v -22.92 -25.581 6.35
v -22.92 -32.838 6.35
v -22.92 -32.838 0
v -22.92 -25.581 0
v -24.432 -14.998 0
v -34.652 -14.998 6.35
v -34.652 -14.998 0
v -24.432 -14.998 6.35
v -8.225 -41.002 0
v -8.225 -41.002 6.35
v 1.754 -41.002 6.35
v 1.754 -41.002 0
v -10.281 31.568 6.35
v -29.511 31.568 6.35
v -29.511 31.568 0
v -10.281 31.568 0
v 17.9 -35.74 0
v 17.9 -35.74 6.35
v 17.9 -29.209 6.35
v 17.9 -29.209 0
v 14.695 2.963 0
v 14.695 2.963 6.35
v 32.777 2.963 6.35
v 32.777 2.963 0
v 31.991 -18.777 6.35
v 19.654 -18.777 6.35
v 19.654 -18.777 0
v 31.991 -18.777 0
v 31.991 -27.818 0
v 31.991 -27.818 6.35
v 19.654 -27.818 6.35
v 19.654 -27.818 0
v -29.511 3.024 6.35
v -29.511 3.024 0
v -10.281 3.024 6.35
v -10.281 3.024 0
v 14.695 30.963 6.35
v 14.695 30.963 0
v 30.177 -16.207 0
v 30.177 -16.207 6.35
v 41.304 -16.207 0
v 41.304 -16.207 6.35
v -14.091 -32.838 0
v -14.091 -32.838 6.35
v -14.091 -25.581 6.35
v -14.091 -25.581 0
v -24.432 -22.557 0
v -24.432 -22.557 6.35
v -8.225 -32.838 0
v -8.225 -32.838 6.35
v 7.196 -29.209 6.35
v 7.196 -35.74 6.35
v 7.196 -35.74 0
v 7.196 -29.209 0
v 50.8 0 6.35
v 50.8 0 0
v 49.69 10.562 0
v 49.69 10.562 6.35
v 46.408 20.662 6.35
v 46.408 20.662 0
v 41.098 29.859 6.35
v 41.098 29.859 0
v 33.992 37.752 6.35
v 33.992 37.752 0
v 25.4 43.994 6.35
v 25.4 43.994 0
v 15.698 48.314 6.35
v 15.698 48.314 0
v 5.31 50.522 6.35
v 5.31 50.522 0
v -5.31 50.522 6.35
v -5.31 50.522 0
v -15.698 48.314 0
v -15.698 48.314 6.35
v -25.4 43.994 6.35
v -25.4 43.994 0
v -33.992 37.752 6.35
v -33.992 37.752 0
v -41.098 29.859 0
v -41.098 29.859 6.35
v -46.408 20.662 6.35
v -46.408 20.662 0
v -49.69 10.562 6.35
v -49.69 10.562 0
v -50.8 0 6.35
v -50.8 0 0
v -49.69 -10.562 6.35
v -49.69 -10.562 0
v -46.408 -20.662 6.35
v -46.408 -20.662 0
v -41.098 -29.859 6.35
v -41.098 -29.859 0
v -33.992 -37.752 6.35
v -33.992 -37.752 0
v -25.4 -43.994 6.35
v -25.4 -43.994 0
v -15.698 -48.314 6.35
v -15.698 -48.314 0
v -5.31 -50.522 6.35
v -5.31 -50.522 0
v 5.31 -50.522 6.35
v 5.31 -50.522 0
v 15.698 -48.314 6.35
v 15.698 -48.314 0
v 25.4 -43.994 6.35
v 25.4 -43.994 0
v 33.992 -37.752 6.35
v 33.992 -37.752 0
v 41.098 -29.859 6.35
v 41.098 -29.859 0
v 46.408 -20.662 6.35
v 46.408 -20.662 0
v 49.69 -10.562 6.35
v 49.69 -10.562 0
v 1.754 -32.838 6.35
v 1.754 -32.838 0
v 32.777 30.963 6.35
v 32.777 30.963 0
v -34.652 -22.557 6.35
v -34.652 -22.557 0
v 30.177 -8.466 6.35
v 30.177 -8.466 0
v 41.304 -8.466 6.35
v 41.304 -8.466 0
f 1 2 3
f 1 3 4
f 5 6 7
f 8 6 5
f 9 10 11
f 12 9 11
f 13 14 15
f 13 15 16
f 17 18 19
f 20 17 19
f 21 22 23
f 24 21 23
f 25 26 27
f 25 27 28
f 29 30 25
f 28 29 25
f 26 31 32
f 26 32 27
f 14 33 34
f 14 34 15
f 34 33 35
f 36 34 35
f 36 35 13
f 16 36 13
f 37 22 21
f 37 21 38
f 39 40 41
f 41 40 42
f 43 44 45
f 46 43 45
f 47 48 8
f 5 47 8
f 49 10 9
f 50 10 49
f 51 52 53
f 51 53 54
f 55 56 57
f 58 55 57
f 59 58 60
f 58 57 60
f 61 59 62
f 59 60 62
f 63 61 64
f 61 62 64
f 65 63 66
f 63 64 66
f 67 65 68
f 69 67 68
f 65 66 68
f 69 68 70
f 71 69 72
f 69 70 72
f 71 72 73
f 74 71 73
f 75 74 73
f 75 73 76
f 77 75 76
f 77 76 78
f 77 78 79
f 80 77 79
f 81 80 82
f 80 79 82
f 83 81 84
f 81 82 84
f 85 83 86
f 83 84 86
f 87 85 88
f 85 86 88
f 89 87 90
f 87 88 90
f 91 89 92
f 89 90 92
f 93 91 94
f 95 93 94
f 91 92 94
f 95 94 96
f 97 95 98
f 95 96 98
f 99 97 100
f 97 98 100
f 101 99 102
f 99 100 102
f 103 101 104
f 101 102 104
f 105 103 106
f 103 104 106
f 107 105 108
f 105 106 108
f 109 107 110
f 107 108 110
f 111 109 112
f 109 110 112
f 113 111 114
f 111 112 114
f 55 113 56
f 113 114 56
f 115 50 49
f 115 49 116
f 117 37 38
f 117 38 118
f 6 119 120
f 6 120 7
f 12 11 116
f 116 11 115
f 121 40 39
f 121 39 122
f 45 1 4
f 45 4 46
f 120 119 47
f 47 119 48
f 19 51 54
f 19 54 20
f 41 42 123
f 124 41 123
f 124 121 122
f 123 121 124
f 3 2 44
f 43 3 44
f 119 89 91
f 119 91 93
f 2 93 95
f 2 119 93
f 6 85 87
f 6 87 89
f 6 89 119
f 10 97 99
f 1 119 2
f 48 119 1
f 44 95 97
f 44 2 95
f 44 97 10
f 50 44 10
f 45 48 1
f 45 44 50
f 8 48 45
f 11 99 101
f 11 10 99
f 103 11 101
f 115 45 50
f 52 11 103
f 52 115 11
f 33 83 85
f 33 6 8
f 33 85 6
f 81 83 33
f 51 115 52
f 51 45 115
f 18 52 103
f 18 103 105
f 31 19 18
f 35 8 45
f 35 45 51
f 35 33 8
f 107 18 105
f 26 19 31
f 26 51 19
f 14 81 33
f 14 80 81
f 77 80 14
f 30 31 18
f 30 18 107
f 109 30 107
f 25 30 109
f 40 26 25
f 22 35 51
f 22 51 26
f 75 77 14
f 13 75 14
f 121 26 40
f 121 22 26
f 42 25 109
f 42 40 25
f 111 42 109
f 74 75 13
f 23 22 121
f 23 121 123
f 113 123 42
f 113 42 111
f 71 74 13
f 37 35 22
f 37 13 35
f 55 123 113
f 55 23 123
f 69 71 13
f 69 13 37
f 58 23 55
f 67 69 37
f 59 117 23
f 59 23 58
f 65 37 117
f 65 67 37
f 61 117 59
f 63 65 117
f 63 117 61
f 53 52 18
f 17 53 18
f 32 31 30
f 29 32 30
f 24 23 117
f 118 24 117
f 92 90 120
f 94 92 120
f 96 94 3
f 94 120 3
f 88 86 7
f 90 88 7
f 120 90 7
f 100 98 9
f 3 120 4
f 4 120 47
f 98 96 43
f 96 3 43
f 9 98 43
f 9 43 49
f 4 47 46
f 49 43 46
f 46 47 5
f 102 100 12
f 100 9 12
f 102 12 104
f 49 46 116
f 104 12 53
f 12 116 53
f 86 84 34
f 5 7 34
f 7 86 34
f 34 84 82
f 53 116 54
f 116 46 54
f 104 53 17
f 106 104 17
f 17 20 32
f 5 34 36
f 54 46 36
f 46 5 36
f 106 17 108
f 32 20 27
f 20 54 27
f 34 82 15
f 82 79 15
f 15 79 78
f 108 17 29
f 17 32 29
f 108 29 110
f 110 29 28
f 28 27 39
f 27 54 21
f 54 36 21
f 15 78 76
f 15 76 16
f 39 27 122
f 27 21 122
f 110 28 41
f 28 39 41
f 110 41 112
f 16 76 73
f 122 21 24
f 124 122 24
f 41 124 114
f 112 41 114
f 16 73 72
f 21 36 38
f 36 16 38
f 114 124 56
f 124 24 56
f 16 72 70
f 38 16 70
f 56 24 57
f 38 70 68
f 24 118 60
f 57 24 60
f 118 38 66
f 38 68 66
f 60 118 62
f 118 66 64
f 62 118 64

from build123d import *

# Parameters (mm, degrees)
SKETCH1_R           = 50.8
BOSS_EXTRUDE1_DEPTH = 6.35
SKETCH2_W           = 19.230854478
SKETCH2_H           = 28.543909792
SKETCH2_W_2         = 18.081841161
SKETCH2_H_2         = 27.999640326
SKETCH2_W_3         = 10.22017109
SKETCH2_H_3         = 7.559298144
SKETCH2_W_4         = 8.829260232
SKETCH2_H_4         = 7.256926218
SKETCH2_W_5         = 9.97827355
SKETCH2_H_5         = 8.164041996
SKETCH2_W_6         = 10.703966172
SKETCH2_H_6         = 6.531233596
SKETCH2_W_7         = 12.336774571
SKETCH2_H_7         = 9.04092058
SKETCH2_W_8         = 11.127286868
SKETCH2_H_8         = 7.7407213
CUT_EXTRUDE1_DEPTH  = 73.122135992


with BuildPart() as part:
    # Sketch1 → Boss-Extrude1 (new body)
    with BuildSketch(Plane.XY):
        Circle(SKETCH1_R)
    extrude(amount=BOSS_EXTRUDE1_DEPTH)

    # Sketch2 → Cut-Extrude1 (cut, through all)
    with BuildSketch(Plane.XY.offset(6.35)):
        with Locations((-19.896072715, 17.295674154)):
            Rectangle(SKETCH2_W, SKETCH2_H)
        with Locations((23.736196173, 16.963065035)):
            Rectangle(SKETCH2_W_2, SKETCH2_H_2)
        with Locations((-29.541737147, -18.77729659)):
            Rectangle(SKETCH2_W_3, SKETCH2_H_3)
        with Locations((-18.505161857, -29.209128029)):
            Rectangle(SKETCH2_W_4, SKETCH2_H_4)
        with Locations((-3.235379606, -36.919612136)):
            Rectangle(SKETCH2_W_5, SKETCH2_H_5)
        with Locations((12.548434919, -32.474744827)):
            Rectangle(SKETCH2_W_6, SKETCH2_H_6)
        with Locations((25.822562461, -23.29775688)):
            Rectangle(SKETCH2_W_7, SKETCH2_H_7)
        with Locations((35.740361625, -12.336774571)):
            Rectangle(SKETCH2_W_8, SKETCH2_H_8)
    extrude(amount=-CUT_EXTRUDE1_DEPTH, mode=Mode.SUBTRACT)


solid = part.part
